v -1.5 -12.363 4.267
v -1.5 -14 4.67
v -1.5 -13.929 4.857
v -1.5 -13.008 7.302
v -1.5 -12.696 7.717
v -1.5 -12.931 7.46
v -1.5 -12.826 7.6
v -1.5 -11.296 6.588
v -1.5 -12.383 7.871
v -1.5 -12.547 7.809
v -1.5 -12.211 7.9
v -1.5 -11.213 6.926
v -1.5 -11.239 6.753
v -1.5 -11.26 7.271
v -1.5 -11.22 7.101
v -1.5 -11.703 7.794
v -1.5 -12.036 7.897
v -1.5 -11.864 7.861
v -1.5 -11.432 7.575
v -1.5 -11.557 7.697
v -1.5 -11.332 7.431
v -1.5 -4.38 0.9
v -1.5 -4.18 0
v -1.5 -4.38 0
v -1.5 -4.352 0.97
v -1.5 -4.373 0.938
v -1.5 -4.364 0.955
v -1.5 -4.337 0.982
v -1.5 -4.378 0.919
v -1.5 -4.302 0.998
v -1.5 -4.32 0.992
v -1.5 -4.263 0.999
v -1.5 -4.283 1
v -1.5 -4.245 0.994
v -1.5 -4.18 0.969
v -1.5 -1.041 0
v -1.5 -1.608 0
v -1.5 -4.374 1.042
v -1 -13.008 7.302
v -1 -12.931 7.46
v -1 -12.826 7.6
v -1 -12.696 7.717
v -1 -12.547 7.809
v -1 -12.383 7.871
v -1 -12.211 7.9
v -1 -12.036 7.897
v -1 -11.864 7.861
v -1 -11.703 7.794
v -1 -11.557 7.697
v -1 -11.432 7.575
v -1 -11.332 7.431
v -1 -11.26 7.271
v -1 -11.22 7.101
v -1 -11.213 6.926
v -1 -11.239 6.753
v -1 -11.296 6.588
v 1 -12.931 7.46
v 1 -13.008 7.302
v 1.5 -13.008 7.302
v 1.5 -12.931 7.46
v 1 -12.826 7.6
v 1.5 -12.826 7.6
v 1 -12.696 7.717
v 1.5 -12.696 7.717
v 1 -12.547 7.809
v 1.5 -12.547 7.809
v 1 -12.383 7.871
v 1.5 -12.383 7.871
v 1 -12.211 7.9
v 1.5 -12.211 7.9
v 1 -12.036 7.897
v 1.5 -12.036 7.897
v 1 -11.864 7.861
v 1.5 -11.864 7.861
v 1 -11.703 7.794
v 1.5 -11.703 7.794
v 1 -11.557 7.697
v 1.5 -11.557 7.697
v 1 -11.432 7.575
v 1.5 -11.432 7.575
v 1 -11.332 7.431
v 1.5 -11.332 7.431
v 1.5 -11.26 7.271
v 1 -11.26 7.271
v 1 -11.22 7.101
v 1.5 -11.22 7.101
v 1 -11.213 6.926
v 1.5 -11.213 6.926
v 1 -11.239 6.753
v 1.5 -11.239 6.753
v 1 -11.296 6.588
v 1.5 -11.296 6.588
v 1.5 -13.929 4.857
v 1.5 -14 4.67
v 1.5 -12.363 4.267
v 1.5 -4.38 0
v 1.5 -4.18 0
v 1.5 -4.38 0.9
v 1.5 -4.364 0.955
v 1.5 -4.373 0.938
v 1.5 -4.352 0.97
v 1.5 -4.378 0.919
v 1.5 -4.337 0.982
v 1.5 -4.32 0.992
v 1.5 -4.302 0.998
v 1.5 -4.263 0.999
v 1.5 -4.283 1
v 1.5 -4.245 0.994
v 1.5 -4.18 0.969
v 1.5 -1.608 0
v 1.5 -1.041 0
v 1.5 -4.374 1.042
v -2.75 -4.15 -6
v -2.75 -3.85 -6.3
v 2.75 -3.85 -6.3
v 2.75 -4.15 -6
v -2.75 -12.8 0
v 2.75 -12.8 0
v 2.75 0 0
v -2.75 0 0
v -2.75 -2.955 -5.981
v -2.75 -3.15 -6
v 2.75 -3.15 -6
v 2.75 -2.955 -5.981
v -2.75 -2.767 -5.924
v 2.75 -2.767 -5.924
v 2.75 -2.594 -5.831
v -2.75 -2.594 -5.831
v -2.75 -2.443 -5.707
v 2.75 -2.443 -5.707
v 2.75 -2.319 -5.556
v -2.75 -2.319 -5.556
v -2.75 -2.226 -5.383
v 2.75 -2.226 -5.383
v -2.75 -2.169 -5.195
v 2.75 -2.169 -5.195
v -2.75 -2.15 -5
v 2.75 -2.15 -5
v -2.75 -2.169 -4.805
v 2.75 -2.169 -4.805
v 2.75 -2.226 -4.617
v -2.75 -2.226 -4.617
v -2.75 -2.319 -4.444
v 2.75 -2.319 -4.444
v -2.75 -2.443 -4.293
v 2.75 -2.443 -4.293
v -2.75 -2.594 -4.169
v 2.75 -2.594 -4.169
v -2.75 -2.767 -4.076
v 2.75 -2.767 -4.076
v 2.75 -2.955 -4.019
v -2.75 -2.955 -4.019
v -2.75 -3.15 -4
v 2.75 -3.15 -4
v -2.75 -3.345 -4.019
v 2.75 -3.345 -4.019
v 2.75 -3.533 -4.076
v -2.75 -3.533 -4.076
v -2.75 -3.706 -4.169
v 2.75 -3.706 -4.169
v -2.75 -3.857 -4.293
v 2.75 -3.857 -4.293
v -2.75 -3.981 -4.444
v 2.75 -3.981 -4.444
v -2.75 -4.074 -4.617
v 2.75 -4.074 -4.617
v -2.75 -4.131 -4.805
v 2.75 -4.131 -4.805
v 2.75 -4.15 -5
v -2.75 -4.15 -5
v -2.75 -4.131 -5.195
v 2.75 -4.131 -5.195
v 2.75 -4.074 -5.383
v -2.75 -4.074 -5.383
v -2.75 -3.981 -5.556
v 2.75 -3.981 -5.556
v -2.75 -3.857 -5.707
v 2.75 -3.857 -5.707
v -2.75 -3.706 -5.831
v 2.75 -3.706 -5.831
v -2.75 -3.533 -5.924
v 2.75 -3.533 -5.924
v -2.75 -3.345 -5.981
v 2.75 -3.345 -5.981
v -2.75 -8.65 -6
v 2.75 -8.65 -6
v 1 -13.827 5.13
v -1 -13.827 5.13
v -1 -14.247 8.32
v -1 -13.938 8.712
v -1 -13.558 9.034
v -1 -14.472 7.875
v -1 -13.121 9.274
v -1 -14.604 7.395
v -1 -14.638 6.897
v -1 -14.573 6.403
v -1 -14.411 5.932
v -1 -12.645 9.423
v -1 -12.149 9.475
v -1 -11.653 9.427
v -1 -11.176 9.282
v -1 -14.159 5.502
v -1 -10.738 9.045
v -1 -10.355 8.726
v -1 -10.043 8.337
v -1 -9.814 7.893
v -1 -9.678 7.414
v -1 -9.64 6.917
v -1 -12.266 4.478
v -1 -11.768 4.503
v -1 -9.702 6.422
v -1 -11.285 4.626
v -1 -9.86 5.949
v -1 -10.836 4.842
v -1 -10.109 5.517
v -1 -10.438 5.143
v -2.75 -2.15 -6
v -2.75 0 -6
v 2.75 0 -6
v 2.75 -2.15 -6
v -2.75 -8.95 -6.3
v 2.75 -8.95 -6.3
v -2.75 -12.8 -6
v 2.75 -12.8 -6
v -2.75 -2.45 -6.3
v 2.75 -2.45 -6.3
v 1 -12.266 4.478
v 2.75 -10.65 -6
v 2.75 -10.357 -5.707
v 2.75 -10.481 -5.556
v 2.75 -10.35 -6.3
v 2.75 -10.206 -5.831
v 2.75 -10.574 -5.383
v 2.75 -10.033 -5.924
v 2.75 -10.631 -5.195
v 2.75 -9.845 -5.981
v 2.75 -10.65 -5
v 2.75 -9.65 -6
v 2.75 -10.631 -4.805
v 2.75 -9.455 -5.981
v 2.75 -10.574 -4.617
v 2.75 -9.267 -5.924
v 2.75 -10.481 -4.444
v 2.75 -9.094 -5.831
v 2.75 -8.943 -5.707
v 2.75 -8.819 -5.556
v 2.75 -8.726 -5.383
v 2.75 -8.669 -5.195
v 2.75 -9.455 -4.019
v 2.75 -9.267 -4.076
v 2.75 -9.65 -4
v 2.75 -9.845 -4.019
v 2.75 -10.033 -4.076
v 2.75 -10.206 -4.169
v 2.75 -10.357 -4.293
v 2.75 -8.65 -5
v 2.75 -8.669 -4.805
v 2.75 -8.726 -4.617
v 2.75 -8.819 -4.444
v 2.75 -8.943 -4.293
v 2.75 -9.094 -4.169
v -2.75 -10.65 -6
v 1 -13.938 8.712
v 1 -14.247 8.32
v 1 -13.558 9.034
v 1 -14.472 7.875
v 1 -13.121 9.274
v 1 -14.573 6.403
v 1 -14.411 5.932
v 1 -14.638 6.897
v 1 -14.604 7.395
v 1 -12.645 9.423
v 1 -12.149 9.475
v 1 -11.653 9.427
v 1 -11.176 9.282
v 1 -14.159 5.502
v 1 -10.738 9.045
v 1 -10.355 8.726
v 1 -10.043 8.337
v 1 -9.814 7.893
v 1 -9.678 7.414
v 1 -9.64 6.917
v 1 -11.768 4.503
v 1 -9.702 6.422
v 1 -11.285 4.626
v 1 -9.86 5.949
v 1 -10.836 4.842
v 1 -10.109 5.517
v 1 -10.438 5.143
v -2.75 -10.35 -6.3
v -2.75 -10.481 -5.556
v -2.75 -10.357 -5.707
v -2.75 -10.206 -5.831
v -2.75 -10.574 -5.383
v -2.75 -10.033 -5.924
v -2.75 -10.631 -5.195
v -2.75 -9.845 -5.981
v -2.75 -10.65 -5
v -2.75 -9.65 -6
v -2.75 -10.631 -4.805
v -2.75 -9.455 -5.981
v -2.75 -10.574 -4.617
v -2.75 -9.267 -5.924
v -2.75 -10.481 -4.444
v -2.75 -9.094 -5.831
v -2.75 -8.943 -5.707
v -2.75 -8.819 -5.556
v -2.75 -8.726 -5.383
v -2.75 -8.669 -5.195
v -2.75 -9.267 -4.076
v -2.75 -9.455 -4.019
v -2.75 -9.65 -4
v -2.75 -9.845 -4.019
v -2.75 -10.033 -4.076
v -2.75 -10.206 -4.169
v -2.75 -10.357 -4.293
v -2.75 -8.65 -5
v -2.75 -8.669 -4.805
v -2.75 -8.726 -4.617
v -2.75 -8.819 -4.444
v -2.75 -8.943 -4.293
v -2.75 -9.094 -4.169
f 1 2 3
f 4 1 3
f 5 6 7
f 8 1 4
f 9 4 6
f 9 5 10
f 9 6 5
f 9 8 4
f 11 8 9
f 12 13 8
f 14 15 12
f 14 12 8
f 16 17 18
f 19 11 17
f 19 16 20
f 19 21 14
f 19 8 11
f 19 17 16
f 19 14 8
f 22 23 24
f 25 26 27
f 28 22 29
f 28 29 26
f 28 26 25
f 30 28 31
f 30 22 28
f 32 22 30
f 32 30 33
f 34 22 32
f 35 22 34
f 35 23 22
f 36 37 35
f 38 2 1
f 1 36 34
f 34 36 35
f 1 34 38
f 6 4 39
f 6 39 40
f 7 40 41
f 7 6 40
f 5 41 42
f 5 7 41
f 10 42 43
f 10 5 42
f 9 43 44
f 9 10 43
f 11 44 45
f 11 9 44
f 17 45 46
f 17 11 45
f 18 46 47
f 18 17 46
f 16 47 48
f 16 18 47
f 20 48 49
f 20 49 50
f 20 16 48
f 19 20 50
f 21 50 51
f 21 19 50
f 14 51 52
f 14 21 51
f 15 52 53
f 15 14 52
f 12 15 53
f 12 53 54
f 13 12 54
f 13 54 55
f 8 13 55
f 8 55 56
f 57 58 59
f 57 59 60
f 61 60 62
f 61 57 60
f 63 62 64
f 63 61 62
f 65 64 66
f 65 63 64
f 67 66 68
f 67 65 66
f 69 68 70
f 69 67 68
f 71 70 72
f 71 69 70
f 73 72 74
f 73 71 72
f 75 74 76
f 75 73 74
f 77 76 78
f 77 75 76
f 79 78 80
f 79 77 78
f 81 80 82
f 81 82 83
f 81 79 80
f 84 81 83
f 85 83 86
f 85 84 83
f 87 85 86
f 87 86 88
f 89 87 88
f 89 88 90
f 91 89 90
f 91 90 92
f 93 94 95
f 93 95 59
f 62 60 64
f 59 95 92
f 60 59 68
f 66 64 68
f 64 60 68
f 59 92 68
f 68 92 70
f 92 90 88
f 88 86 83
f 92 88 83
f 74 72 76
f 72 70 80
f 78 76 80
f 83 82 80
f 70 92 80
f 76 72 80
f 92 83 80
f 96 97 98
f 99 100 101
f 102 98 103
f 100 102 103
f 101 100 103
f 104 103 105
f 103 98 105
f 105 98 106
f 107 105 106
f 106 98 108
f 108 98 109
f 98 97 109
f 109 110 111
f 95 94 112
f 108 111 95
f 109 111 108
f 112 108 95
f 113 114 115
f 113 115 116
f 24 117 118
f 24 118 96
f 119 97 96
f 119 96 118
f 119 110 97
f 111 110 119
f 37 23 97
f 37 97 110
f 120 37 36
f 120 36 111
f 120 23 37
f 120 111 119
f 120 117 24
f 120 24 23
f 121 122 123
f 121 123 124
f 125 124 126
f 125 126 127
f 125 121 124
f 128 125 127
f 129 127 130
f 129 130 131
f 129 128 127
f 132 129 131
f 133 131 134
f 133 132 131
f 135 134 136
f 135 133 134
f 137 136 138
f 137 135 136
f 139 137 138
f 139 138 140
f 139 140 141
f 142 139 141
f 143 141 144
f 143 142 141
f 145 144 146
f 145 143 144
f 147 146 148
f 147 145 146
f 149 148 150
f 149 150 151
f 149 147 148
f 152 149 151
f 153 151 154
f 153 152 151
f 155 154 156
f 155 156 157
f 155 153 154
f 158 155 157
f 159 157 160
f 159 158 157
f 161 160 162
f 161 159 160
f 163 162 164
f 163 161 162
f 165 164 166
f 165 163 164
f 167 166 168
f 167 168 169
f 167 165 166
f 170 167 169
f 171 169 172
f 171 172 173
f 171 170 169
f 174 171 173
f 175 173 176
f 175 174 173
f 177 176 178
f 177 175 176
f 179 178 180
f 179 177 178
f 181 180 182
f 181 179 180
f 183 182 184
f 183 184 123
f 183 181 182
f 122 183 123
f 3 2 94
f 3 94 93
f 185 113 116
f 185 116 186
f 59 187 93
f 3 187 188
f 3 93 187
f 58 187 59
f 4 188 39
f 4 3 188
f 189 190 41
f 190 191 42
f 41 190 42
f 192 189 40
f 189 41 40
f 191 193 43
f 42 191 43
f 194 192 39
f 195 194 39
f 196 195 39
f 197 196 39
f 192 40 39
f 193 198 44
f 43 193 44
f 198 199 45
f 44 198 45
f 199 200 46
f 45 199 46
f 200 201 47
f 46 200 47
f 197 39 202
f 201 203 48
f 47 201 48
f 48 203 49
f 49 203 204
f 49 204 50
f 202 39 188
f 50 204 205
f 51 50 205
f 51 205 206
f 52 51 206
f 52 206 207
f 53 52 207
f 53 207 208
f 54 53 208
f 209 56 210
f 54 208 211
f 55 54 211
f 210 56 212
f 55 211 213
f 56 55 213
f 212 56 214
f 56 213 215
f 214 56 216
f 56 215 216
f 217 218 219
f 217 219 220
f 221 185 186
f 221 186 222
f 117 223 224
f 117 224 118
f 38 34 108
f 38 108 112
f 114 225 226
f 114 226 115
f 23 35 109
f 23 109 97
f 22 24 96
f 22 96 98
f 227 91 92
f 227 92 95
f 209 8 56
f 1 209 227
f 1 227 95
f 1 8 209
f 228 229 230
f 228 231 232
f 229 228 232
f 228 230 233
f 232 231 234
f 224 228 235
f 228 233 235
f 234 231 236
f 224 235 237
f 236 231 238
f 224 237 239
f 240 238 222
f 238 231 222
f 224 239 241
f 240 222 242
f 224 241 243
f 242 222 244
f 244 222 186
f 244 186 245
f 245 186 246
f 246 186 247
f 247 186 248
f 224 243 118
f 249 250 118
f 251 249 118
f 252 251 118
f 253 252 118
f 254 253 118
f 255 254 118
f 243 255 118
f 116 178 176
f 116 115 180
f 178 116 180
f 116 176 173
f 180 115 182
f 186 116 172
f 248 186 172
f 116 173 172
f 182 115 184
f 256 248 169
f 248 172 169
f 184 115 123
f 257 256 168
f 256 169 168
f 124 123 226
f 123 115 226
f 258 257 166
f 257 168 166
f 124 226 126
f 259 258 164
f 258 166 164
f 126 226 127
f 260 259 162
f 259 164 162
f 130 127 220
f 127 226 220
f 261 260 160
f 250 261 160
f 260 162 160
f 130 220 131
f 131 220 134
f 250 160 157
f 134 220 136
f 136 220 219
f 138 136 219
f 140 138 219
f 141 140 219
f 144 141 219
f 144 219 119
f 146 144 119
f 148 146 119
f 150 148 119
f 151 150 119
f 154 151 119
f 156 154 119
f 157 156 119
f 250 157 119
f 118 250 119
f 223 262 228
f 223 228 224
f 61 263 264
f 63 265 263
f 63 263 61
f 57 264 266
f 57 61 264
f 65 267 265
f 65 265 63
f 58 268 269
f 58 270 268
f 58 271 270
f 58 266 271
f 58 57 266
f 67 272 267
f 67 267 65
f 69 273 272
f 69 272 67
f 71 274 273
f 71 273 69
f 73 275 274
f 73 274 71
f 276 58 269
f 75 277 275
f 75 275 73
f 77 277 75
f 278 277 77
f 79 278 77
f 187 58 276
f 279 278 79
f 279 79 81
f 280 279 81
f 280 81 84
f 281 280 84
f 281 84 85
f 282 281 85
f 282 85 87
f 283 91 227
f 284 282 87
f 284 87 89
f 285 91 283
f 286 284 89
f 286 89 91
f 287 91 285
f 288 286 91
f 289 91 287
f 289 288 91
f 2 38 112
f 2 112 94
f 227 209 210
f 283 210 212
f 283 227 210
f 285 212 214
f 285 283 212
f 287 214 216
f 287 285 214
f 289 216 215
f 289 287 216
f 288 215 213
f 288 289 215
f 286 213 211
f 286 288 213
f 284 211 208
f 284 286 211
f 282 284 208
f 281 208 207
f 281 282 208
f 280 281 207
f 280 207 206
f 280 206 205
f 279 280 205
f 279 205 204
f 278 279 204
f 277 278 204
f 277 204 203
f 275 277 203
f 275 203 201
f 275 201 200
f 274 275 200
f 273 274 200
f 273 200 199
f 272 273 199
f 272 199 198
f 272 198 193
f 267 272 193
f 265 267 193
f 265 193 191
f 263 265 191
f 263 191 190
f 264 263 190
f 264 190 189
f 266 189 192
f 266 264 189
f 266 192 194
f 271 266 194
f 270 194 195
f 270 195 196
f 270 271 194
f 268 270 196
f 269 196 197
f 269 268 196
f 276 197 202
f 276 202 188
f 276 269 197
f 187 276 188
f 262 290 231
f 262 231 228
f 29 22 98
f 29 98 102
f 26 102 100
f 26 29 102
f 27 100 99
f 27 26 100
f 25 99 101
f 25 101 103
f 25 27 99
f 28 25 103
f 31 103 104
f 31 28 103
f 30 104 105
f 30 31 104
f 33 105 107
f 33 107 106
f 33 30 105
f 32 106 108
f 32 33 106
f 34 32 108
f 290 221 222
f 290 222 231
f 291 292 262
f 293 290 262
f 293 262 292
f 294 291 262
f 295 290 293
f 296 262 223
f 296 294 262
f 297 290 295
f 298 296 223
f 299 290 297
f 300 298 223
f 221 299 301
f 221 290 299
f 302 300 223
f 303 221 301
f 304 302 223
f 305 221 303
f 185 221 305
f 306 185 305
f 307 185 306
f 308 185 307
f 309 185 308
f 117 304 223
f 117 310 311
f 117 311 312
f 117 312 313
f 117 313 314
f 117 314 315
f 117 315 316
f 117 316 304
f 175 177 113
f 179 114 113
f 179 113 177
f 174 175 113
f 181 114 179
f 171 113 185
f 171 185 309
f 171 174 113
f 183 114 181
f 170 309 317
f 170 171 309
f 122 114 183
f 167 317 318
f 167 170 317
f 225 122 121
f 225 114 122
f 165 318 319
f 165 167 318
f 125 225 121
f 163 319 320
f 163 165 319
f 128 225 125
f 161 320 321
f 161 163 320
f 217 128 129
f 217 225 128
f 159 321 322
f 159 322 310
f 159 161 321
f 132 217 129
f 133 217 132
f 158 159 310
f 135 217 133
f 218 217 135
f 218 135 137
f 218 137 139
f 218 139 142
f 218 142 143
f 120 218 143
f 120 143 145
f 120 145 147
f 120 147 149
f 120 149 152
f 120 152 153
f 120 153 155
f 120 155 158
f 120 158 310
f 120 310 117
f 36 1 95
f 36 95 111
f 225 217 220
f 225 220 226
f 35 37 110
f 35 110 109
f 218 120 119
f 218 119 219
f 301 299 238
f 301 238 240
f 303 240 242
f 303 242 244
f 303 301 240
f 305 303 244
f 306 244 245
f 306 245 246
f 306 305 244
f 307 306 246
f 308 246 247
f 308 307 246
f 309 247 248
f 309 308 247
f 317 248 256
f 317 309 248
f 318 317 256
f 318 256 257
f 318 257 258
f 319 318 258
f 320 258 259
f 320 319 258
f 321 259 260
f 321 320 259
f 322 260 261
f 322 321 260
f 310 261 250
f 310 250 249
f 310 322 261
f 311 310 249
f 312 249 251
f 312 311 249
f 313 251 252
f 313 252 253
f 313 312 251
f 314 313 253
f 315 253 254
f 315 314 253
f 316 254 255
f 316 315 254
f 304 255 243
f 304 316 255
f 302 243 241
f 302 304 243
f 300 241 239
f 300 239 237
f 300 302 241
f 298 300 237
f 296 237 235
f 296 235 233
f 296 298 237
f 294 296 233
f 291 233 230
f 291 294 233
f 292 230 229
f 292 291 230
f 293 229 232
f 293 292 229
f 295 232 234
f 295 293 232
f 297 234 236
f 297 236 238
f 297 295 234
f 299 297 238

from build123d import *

# Parameters (mm, degrees)
EXTRUDE_2_DEPTH      = 2.75
EXTRUDE_2_DEPTH_BACK = 2.75
SKETCH_1_R           = 1
EXTRUDE_3_DEPTH      = 1.5
EXTRUDE_3_DEPTH_BACK = 1.5
SKETCH_3_R           = 2.5
EXTRUDE_4_DEPTH      = 1


with BuildPart() as part:
    # 草图1 → 凸台-拉伸2 (new, two sides: drawn at the far end of the back side and taken through both)
    with BuildSketch(Plane(origin=(0, 0, 0), x_dir=(0, 0, -1), z_dir=(1, 0, 0)).offset(-EXTRUDE_2_DEPTH_BACK)):
        Polygon((0, 0), (6, 0), (6, -2.15), (6.3, -2.45), (6.3, -3.85), (6, -4.15), (6, -8.65), (6.3, -8.95), (6.3, -10.35), (6, -10.65), (6, -12.8), (0, -12.8), align=None)
        with Locations((5, -3.15)):
            Circle(SKETCH_1_R, mode=Mode.SUBTRACT)
        with Locations((5, -9.65)):
            Circle(SKETCH_1_R, mode=Mode.SUBTRACT)
    extrude(amount=EXTRUDE_2_DEPTH + EXTRUDE_2_DEPTH_BACK)

    # 草图2 → 凸台-拉伸3 (add, two sides: drawn at the far end of the back side and taken through both)
    with BuildSketch(Plane(origin=(0, 0, 0), x_dir=(0, 0, -1), z_dir=(1, 0, 0)).offset(-EXTRUDE_3_DEPTH_BACK)):
        with BuildLine():
            Line((0.187151005, -1.111689384), (-0.969179354, -4.18))
            Line((-0.969179354, -4.18), (-0.9, -4.18))
            Line((-0.9, -4.18), (0, -4.18))
            Line((0, -4.18), (0, -4.38))
            Line((0, -4.38), (-0.9, -4.38))
            ThreePointArc((-0.9, -4.38), (-0.982239003, -4.336892411), (-0.993575503, -4.244734928))
            Line((-0.993575503, -4.244734928), (-1.042296193, -4.374014774))
            Line((-1.042296193, -4.374014774), (-4.669966382, -14))
            Line((-4.669966382, -14), (-4.857117387, -13.929469856))
            Line((-4.857117387, -13.929469856), (-7.302366921, -13.007947681))
            ThreePointArc((-7.302366921, -13.007947681), (-7.831389963, -11.781984382), (-6.587549984, -11.296481041))
            Line((-6.587549984, -11.296481041), (-4.266871892, -12.363259556))
            Line((-4.266871892, -12.363259556), (0, -1.04115924))
            Line((0, -1.04115924), (0.187151005, -1.111689384))
        make_face()
    extrude(amount=EXTRUDE_3_DEPTH + EXTRUDE_3_DEPTH_BACK)

    # 草图3 → 凸台-拉伸4 (add, symmetric)
    with BuildSketch(Plane(origin=(0, 0, 0), x_dir=(0, 0, -1), z_dir=(1, 0, 0))):
        with Locations((-6.975125085, -12.139614863)):
            Circle(SKETCH_3_R)
    extrude(amount=EXTRUDE_4_DEPTH, both=True)


solid = part.part
